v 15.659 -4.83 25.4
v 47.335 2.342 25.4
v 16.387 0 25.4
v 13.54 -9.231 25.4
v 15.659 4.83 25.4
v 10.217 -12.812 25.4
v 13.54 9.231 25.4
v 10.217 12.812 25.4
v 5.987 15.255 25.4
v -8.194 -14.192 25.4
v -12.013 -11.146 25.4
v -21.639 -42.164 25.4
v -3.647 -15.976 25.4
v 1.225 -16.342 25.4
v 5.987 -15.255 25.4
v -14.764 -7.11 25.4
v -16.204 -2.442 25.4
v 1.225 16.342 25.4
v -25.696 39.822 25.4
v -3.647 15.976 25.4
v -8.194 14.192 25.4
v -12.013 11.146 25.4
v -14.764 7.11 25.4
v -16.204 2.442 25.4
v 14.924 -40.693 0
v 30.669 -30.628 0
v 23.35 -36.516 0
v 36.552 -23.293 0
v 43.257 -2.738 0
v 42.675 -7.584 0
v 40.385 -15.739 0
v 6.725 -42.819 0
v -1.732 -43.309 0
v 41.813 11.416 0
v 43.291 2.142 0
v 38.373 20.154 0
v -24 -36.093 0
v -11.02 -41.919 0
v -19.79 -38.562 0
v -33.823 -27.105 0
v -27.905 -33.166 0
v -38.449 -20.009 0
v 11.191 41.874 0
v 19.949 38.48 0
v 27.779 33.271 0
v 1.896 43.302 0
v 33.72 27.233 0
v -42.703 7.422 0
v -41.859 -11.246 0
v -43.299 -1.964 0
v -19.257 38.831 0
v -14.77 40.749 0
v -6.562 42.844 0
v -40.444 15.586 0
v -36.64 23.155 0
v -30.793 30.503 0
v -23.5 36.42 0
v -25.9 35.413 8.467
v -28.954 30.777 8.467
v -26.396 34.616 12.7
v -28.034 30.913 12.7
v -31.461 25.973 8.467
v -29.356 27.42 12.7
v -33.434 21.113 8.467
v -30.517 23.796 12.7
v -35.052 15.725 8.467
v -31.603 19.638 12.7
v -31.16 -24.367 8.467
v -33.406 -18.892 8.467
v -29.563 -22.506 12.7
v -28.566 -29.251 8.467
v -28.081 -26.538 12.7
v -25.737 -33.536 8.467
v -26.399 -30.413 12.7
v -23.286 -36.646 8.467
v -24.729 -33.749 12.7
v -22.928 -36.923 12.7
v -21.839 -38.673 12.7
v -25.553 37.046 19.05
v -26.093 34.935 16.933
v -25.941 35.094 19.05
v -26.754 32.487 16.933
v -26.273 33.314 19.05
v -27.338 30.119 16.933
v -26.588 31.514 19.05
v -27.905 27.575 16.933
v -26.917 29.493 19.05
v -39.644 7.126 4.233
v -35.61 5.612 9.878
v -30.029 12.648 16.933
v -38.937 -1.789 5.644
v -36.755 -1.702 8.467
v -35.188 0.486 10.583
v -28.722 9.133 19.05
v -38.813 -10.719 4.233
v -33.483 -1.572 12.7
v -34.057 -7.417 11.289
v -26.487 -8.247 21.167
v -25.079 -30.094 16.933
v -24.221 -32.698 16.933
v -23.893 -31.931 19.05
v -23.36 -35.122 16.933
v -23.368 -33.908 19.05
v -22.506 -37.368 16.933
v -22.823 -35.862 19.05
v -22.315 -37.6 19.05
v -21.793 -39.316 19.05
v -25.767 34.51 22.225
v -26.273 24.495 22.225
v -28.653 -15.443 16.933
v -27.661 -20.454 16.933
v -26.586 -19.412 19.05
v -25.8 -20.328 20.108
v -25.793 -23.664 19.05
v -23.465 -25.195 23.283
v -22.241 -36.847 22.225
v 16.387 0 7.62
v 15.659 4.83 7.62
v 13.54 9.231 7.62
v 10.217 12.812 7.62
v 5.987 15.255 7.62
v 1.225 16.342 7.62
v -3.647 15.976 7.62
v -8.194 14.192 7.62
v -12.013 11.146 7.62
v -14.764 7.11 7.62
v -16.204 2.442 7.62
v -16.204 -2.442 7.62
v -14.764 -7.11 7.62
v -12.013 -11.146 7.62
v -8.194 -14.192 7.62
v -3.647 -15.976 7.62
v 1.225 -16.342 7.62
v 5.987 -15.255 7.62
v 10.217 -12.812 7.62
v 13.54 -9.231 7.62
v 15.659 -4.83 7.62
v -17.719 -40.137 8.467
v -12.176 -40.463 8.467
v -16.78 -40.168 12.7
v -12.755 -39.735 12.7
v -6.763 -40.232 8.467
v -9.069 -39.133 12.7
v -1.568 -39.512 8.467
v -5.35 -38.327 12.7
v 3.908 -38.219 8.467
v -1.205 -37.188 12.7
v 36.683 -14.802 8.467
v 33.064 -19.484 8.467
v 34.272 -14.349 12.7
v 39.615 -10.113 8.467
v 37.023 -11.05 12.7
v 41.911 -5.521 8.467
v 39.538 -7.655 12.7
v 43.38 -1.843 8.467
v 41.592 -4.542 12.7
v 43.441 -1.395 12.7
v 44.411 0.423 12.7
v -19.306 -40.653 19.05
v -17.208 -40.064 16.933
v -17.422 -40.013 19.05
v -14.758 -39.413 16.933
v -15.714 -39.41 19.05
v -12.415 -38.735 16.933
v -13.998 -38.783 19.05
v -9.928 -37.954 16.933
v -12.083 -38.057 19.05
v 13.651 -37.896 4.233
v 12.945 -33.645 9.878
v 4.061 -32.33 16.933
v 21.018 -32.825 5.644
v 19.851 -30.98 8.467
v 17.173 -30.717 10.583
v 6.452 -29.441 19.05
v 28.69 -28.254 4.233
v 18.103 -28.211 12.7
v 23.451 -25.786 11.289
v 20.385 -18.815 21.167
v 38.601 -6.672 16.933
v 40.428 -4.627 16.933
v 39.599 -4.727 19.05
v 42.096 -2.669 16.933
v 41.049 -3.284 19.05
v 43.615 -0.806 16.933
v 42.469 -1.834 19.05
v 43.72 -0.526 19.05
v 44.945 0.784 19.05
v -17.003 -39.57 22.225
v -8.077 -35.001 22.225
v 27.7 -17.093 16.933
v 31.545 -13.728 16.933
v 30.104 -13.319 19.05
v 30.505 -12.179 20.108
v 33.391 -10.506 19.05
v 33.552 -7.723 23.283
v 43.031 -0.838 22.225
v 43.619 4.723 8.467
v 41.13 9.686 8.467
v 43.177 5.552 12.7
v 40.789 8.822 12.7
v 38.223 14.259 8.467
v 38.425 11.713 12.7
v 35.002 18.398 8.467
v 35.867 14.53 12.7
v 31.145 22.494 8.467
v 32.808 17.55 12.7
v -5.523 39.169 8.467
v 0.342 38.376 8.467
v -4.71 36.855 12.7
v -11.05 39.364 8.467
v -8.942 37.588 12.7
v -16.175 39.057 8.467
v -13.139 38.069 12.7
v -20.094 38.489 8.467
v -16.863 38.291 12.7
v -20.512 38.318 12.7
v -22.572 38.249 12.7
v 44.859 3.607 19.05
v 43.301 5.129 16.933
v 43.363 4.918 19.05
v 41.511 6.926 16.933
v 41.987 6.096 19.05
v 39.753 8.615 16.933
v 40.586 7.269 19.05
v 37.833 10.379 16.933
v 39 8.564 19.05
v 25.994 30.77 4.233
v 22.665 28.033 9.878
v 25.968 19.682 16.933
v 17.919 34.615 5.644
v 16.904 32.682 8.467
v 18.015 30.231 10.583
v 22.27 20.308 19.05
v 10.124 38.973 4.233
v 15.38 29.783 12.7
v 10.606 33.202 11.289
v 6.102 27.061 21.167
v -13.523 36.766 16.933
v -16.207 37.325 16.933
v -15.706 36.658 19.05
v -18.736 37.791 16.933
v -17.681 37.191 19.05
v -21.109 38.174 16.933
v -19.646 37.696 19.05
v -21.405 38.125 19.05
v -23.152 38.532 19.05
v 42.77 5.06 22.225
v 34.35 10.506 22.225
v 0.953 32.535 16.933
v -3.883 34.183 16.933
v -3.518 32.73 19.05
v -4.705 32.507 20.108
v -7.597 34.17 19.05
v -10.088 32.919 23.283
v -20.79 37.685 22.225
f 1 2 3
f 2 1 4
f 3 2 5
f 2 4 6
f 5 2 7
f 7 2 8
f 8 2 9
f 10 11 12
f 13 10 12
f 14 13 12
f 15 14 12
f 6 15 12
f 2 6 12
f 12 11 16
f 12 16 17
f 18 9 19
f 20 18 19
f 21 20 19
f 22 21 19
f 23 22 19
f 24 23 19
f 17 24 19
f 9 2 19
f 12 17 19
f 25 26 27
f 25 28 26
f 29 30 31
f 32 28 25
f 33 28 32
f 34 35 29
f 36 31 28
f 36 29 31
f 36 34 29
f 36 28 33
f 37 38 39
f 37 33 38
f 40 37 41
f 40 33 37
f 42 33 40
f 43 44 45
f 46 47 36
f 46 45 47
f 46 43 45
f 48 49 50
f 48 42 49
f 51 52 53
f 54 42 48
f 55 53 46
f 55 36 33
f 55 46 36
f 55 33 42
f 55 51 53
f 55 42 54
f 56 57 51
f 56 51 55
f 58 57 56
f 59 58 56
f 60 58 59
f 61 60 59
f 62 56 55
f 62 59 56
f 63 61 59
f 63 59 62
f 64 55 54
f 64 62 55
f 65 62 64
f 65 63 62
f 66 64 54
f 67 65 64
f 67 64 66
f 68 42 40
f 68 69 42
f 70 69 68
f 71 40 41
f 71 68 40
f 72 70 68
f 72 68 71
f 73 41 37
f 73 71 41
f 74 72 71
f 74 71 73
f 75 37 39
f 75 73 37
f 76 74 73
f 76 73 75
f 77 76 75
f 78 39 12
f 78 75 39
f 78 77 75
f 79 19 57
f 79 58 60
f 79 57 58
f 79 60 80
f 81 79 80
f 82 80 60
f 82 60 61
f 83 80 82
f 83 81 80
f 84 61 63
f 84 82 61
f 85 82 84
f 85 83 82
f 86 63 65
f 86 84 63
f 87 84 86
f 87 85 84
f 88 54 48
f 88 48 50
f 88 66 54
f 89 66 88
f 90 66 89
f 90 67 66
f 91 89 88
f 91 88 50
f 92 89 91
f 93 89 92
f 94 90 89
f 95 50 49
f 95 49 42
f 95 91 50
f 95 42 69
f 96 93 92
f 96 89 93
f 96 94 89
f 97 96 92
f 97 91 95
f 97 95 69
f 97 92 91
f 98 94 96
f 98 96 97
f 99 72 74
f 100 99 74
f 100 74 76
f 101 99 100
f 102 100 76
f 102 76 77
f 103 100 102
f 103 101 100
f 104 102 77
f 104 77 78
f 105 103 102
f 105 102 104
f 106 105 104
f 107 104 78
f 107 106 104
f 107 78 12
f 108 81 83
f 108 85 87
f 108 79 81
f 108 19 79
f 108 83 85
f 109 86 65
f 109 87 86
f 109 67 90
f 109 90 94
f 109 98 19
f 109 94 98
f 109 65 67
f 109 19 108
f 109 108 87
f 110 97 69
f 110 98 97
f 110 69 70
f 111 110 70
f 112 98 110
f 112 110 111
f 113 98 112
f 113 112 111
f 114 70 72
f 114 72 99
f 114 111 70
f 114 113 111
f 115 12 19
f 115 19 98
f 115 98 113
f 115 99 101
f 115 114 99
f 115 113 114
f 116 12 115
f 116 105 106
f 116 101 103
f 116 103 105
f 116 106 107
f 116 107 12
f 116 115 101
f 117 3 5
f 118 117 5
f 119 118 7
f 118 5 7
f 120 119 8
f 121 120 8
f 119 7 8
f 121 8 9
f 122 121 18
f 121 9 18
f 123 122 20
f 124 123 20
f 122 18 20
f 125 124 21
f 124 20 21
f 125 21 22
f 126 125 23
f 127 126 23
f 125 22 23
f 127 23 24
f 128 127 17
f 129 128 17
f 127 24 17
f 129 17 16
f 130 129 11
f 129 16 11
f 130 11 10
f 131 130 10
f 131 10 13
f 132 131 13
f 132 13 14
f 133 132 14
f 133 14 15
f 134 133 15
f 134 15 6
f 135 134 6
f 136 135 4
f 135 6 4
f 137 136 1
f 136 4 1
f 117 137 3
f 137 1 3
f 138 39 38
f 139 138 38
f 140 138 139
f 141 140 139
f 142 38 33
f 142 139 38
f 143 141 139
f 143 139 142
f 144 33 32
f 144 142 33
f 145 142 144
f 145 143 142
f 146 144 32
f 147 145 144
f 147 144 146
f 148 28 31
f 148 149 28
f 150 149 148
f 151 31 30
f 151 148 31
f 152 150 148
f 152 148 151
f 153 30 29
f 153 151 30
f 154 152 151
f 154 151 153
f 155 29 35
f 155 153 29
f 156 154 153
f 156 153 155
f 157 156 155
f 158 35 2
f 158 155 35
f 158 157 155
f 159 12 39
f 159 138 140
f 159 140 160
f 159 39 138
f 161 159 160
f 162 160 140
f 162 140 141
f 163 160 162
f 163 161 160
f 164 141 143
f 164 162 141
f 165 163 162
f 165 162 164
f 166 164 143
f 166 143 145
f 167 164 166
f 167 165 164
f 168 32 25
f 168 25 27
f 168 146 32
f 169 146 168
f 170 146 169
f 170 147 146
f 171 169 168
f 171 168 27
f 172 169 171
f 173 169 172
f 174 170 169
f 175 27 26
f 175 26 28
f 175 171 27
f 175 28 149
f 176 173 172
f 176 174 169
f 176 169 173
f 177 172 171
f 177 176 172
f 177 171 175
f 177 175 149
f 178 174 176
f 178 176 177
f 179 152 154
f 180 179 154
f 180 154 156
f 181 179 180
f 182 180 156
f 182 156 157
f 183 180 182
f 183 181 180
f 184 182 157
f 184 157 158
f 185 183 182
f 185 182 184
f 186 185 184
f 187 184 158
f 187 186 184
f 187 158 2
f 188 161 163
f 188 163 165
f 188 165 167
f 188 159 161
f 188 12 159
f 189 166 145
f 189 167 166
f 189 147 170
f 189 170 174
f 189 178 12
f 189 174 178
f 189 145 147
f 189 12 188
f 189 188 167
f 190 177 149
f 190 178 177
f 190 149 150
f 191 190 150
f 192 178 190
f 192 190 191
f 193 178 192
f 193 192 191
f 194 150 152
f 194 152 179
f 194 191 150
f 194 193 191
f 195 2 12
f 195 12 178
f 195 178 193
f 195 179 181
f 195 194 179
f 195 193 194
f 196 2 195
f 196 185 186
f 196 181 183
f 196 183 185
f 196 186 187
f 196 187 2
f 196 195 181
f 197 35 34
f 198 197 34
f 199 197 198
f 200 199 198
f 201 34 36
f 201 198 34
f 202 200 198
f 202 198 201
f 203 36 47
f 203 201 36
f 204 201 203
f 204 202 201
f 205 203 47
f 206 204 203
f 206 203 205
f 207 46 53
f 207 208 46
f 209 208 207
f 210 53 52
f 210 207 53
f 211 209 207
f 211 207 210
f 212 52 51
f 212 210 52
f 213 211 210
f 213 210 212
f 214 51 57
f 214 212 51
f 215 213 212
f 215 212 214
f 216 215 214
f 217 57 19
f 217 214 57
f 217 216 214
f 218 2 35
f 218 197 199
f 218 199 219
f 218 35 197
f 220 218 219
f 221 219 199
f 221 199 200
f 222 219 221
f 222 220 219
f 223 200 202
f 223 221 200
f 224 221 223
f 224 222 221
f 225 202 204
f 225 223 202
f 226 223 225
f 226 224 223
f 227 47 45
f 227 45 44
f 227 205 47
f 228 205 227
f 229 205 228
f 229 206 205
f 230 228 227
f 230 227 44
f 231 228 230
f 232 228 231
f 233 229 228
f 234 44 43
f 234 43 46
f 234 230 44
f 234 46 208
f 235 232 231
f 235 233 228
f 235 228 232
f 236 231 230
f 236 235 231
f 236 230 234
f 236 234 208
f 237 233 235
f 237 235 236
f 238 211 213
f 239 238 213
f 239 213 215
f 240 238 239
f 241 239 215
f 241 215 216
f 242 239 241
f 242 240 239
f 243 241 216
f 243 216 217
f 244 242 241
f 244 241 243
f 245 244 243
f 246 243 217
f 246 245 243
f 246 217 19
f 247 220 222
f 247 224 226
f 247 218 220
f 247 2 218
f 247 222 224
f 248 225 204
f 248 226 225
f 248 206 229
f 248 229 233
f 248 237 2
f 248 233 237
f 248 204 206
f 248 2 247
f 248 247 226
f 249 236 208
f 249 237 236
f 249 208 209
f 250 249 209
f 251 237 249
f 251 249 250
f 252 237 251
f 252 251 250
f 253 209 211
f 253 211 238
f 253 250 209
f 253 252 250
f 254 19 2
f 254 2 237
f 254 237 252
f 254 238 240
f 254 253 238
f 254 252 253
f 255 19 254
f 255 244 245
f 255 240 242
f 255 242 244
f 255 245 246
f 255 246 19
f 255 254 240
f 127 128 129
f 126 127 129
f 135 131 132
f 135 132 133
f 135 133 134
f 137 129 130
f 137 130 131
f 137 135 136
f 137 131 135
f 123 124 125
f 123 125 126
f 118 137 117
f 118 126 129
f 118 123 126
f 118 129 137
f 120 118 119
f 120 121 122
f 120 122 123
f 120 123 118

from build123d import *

# Parameters (mm, degrees)
F4_R     = 16.3873393924
F5_DEPTH = 17.78


# Not quite as in the source:
# - the arcs of a loft's sections are written as splines that run evenly, so that the points pair up as in the source's solid


with BuildPart() as f3:
    # F1 (on Top) → F3 section 0
    with BuildSketch(Plane.XY):
        with BuildLine():
            add(Edge.make_bspline(
                [(43.2906929066, 2.1420251998), (43.1660749319, 4.6605756221), (42.821117674, 7.168184659), (41.7009847964, 12.0854812551), (40.9258264748, 14.495092877), (38.9688313396, 19.1431756557), (37.7870247476, 21.3815750327), (35.0526296616, 25.6192143509), (33.5000833946, 27.6183888507), (30.071371569, 31.3168261821), (28.1952589595, 33.0160318991), (24.176410068, 36.0628920967), (22.0337358485, 37.4104995251), (17.546860581, 39.7132052837), (15.2027288233, 40.6682680536), (10.3841586143, 42.156852824), (7.9097945757, 42.6903518365), (2.9059392428, 43.3195857237), (0.3765252225, 43.4153108812), (-4.6605756221, 43.1660749319), (-7.168184659, 42.821117674), (-12.0854812551, 41.7009847964), (-14.495092877, 40.9258264748), (-19.1431756557, 38.9688313396), (-21.3815750327, 37.7870247476), (-23.5003946918, 36.4198272046)],
                knots=[0, 0, 0, 0, 0.0833333333, 0.0833333333, 0.1666666667, 0.1666666667, 0.25, 0.25, 0.3333333333, 0.3333333333, 0.4166666667, 0.4166666667, 0.5, 0.5, 0.5833333333, 0.5833333333, 0.6666666667, 0.6666666667, 0.75, 0.75, 0.8333333333, 0.8333333333, 0.9166666667, 0.9166666667, 1, 1, 1, 1], degree=3))
            add(Edge.make_bspline(
                [(-23.5003946918, 36.4198272046), (-25.6192143509, 35.0526296616), (-27.6183888507, 33.5000833946), (-31.3168261821, 30.071371569), (-33.0160318991, 28.1952589595), (-36.0628920967, 24.176410068), (-37.4104995251, 22.0337358485), (-39.7132052837, 17.546860581), (-40.6682680536, 15.2027288233), (-42.156852824, 10.3841586143), (-42.6903518365, 7.9097945757), (-43.3195857237, 2.9059392428), (-43.4153108812, 0.3765252225), (-43.1660749319, -4.6605756221), (-42.821117674, -7.168184659), (-41.7009847964, -12.0854812551), (-40.9258264748, -14.495092877), (-38.9688313396, -19.1431756557), (-37.7870247476, -21.3815750327), (-35.0526296616, -25.6192143509), (-33.5000833946, -27.6183888507), (-30.071371569, -31.3168261821), (-28.1952589595, -33.0160318991), (-24.176410068, -36.0628920967), (-22.0337358485, -37.4104995251), (-19.7902982147, -38.5618524044)],
                knots=[0, 0, 0, 0, 0.0833333333, 0.0833333333, 0.1666666667, 0.1666666667, 0.25, 0.25, 0.3333333333, 0.3333333333, 0.4166666667, 0.4166666667, 0.5, 0.5, 0.5833333333, 0.5833333333, 0.6666666667, 0.6666666667, 0.75, 0.75, 0.8333333333, 0.8333333333, 0.9166666667, 0.9166666667, 1, 1, 1, 1], degree=3))
            add(Edge.make_bspline(
                [(-19.7902982147, -38.5618524044), (-17.546860581, -39.7132052837), (-15.2027288233, -40.6682680536), (-10.3841586143, -42.156852824), (-7.9097945757, -42.6903518365), (-2.9059392428, -43.3195857237), (-0.3765252225, -43.4153108812), (4.6605756221, -43.1660749319), (7.168184659, -42.821117674), (12.0854812551, -41.7009847964), (14.495092877, -40.9258264748), (19.1431756557, -38.9688313396), (21.3815750327, -37.7870247476), (25.6192143509, -35.0526296616), (27.6183888507, -33.5000833946), (31.3168261821, -30.071371569), (33.0160318991, -28.1952589595), (36.0628920967, -24.176410068), (37.4104995251, -22.0337358485), (39.7132052837, -17.546860581), (40.6682680536, -15.2027288233), (42.156852824, -10.3841586143), (42.6903518365, -7.9097945757), (43.3195857237, -2.9059392428), (43.4153108812, -0.3765252225), (43.2906929066, 2.1420251998)],
                knots=[0, 0, 0, 0, 0.0833333333, 0.0833333333, 0.1666666667, 0.1666666667, 0.25, 0.25, 0.3333333333, 0.3333333333, 0.4166666667, 0.4166666667, 0.5, 0.5, 0.5833333333, 0.5833333333, 0.6666666667, 0.6666666667, 0.75, 0.75, 0.8333333333, 0.8333333333, 0.9166666667, 0.9166666667, 1, 1, 1, 1], degree=3))
        make_face()
    # F2 (on offset) → F3 section 1
    with BuildSketch(Plane.XY.offset(25.4)):
        Polygon((47.3345444493, 2.3421151343), (-25.6956034295, 39.8218604025), (-21.6389410198, -42.1639755368), align=None)
    loft(ruled=True)

    # F4 (on face) → F5 (cut)
    with BuildSketch(Plane.XY.offset(25.4)):
        Circle(F4_R)
    extrude(amount=-F5_DEPTH, mode=Mode.SUBTRACT)


solid = f3.part
